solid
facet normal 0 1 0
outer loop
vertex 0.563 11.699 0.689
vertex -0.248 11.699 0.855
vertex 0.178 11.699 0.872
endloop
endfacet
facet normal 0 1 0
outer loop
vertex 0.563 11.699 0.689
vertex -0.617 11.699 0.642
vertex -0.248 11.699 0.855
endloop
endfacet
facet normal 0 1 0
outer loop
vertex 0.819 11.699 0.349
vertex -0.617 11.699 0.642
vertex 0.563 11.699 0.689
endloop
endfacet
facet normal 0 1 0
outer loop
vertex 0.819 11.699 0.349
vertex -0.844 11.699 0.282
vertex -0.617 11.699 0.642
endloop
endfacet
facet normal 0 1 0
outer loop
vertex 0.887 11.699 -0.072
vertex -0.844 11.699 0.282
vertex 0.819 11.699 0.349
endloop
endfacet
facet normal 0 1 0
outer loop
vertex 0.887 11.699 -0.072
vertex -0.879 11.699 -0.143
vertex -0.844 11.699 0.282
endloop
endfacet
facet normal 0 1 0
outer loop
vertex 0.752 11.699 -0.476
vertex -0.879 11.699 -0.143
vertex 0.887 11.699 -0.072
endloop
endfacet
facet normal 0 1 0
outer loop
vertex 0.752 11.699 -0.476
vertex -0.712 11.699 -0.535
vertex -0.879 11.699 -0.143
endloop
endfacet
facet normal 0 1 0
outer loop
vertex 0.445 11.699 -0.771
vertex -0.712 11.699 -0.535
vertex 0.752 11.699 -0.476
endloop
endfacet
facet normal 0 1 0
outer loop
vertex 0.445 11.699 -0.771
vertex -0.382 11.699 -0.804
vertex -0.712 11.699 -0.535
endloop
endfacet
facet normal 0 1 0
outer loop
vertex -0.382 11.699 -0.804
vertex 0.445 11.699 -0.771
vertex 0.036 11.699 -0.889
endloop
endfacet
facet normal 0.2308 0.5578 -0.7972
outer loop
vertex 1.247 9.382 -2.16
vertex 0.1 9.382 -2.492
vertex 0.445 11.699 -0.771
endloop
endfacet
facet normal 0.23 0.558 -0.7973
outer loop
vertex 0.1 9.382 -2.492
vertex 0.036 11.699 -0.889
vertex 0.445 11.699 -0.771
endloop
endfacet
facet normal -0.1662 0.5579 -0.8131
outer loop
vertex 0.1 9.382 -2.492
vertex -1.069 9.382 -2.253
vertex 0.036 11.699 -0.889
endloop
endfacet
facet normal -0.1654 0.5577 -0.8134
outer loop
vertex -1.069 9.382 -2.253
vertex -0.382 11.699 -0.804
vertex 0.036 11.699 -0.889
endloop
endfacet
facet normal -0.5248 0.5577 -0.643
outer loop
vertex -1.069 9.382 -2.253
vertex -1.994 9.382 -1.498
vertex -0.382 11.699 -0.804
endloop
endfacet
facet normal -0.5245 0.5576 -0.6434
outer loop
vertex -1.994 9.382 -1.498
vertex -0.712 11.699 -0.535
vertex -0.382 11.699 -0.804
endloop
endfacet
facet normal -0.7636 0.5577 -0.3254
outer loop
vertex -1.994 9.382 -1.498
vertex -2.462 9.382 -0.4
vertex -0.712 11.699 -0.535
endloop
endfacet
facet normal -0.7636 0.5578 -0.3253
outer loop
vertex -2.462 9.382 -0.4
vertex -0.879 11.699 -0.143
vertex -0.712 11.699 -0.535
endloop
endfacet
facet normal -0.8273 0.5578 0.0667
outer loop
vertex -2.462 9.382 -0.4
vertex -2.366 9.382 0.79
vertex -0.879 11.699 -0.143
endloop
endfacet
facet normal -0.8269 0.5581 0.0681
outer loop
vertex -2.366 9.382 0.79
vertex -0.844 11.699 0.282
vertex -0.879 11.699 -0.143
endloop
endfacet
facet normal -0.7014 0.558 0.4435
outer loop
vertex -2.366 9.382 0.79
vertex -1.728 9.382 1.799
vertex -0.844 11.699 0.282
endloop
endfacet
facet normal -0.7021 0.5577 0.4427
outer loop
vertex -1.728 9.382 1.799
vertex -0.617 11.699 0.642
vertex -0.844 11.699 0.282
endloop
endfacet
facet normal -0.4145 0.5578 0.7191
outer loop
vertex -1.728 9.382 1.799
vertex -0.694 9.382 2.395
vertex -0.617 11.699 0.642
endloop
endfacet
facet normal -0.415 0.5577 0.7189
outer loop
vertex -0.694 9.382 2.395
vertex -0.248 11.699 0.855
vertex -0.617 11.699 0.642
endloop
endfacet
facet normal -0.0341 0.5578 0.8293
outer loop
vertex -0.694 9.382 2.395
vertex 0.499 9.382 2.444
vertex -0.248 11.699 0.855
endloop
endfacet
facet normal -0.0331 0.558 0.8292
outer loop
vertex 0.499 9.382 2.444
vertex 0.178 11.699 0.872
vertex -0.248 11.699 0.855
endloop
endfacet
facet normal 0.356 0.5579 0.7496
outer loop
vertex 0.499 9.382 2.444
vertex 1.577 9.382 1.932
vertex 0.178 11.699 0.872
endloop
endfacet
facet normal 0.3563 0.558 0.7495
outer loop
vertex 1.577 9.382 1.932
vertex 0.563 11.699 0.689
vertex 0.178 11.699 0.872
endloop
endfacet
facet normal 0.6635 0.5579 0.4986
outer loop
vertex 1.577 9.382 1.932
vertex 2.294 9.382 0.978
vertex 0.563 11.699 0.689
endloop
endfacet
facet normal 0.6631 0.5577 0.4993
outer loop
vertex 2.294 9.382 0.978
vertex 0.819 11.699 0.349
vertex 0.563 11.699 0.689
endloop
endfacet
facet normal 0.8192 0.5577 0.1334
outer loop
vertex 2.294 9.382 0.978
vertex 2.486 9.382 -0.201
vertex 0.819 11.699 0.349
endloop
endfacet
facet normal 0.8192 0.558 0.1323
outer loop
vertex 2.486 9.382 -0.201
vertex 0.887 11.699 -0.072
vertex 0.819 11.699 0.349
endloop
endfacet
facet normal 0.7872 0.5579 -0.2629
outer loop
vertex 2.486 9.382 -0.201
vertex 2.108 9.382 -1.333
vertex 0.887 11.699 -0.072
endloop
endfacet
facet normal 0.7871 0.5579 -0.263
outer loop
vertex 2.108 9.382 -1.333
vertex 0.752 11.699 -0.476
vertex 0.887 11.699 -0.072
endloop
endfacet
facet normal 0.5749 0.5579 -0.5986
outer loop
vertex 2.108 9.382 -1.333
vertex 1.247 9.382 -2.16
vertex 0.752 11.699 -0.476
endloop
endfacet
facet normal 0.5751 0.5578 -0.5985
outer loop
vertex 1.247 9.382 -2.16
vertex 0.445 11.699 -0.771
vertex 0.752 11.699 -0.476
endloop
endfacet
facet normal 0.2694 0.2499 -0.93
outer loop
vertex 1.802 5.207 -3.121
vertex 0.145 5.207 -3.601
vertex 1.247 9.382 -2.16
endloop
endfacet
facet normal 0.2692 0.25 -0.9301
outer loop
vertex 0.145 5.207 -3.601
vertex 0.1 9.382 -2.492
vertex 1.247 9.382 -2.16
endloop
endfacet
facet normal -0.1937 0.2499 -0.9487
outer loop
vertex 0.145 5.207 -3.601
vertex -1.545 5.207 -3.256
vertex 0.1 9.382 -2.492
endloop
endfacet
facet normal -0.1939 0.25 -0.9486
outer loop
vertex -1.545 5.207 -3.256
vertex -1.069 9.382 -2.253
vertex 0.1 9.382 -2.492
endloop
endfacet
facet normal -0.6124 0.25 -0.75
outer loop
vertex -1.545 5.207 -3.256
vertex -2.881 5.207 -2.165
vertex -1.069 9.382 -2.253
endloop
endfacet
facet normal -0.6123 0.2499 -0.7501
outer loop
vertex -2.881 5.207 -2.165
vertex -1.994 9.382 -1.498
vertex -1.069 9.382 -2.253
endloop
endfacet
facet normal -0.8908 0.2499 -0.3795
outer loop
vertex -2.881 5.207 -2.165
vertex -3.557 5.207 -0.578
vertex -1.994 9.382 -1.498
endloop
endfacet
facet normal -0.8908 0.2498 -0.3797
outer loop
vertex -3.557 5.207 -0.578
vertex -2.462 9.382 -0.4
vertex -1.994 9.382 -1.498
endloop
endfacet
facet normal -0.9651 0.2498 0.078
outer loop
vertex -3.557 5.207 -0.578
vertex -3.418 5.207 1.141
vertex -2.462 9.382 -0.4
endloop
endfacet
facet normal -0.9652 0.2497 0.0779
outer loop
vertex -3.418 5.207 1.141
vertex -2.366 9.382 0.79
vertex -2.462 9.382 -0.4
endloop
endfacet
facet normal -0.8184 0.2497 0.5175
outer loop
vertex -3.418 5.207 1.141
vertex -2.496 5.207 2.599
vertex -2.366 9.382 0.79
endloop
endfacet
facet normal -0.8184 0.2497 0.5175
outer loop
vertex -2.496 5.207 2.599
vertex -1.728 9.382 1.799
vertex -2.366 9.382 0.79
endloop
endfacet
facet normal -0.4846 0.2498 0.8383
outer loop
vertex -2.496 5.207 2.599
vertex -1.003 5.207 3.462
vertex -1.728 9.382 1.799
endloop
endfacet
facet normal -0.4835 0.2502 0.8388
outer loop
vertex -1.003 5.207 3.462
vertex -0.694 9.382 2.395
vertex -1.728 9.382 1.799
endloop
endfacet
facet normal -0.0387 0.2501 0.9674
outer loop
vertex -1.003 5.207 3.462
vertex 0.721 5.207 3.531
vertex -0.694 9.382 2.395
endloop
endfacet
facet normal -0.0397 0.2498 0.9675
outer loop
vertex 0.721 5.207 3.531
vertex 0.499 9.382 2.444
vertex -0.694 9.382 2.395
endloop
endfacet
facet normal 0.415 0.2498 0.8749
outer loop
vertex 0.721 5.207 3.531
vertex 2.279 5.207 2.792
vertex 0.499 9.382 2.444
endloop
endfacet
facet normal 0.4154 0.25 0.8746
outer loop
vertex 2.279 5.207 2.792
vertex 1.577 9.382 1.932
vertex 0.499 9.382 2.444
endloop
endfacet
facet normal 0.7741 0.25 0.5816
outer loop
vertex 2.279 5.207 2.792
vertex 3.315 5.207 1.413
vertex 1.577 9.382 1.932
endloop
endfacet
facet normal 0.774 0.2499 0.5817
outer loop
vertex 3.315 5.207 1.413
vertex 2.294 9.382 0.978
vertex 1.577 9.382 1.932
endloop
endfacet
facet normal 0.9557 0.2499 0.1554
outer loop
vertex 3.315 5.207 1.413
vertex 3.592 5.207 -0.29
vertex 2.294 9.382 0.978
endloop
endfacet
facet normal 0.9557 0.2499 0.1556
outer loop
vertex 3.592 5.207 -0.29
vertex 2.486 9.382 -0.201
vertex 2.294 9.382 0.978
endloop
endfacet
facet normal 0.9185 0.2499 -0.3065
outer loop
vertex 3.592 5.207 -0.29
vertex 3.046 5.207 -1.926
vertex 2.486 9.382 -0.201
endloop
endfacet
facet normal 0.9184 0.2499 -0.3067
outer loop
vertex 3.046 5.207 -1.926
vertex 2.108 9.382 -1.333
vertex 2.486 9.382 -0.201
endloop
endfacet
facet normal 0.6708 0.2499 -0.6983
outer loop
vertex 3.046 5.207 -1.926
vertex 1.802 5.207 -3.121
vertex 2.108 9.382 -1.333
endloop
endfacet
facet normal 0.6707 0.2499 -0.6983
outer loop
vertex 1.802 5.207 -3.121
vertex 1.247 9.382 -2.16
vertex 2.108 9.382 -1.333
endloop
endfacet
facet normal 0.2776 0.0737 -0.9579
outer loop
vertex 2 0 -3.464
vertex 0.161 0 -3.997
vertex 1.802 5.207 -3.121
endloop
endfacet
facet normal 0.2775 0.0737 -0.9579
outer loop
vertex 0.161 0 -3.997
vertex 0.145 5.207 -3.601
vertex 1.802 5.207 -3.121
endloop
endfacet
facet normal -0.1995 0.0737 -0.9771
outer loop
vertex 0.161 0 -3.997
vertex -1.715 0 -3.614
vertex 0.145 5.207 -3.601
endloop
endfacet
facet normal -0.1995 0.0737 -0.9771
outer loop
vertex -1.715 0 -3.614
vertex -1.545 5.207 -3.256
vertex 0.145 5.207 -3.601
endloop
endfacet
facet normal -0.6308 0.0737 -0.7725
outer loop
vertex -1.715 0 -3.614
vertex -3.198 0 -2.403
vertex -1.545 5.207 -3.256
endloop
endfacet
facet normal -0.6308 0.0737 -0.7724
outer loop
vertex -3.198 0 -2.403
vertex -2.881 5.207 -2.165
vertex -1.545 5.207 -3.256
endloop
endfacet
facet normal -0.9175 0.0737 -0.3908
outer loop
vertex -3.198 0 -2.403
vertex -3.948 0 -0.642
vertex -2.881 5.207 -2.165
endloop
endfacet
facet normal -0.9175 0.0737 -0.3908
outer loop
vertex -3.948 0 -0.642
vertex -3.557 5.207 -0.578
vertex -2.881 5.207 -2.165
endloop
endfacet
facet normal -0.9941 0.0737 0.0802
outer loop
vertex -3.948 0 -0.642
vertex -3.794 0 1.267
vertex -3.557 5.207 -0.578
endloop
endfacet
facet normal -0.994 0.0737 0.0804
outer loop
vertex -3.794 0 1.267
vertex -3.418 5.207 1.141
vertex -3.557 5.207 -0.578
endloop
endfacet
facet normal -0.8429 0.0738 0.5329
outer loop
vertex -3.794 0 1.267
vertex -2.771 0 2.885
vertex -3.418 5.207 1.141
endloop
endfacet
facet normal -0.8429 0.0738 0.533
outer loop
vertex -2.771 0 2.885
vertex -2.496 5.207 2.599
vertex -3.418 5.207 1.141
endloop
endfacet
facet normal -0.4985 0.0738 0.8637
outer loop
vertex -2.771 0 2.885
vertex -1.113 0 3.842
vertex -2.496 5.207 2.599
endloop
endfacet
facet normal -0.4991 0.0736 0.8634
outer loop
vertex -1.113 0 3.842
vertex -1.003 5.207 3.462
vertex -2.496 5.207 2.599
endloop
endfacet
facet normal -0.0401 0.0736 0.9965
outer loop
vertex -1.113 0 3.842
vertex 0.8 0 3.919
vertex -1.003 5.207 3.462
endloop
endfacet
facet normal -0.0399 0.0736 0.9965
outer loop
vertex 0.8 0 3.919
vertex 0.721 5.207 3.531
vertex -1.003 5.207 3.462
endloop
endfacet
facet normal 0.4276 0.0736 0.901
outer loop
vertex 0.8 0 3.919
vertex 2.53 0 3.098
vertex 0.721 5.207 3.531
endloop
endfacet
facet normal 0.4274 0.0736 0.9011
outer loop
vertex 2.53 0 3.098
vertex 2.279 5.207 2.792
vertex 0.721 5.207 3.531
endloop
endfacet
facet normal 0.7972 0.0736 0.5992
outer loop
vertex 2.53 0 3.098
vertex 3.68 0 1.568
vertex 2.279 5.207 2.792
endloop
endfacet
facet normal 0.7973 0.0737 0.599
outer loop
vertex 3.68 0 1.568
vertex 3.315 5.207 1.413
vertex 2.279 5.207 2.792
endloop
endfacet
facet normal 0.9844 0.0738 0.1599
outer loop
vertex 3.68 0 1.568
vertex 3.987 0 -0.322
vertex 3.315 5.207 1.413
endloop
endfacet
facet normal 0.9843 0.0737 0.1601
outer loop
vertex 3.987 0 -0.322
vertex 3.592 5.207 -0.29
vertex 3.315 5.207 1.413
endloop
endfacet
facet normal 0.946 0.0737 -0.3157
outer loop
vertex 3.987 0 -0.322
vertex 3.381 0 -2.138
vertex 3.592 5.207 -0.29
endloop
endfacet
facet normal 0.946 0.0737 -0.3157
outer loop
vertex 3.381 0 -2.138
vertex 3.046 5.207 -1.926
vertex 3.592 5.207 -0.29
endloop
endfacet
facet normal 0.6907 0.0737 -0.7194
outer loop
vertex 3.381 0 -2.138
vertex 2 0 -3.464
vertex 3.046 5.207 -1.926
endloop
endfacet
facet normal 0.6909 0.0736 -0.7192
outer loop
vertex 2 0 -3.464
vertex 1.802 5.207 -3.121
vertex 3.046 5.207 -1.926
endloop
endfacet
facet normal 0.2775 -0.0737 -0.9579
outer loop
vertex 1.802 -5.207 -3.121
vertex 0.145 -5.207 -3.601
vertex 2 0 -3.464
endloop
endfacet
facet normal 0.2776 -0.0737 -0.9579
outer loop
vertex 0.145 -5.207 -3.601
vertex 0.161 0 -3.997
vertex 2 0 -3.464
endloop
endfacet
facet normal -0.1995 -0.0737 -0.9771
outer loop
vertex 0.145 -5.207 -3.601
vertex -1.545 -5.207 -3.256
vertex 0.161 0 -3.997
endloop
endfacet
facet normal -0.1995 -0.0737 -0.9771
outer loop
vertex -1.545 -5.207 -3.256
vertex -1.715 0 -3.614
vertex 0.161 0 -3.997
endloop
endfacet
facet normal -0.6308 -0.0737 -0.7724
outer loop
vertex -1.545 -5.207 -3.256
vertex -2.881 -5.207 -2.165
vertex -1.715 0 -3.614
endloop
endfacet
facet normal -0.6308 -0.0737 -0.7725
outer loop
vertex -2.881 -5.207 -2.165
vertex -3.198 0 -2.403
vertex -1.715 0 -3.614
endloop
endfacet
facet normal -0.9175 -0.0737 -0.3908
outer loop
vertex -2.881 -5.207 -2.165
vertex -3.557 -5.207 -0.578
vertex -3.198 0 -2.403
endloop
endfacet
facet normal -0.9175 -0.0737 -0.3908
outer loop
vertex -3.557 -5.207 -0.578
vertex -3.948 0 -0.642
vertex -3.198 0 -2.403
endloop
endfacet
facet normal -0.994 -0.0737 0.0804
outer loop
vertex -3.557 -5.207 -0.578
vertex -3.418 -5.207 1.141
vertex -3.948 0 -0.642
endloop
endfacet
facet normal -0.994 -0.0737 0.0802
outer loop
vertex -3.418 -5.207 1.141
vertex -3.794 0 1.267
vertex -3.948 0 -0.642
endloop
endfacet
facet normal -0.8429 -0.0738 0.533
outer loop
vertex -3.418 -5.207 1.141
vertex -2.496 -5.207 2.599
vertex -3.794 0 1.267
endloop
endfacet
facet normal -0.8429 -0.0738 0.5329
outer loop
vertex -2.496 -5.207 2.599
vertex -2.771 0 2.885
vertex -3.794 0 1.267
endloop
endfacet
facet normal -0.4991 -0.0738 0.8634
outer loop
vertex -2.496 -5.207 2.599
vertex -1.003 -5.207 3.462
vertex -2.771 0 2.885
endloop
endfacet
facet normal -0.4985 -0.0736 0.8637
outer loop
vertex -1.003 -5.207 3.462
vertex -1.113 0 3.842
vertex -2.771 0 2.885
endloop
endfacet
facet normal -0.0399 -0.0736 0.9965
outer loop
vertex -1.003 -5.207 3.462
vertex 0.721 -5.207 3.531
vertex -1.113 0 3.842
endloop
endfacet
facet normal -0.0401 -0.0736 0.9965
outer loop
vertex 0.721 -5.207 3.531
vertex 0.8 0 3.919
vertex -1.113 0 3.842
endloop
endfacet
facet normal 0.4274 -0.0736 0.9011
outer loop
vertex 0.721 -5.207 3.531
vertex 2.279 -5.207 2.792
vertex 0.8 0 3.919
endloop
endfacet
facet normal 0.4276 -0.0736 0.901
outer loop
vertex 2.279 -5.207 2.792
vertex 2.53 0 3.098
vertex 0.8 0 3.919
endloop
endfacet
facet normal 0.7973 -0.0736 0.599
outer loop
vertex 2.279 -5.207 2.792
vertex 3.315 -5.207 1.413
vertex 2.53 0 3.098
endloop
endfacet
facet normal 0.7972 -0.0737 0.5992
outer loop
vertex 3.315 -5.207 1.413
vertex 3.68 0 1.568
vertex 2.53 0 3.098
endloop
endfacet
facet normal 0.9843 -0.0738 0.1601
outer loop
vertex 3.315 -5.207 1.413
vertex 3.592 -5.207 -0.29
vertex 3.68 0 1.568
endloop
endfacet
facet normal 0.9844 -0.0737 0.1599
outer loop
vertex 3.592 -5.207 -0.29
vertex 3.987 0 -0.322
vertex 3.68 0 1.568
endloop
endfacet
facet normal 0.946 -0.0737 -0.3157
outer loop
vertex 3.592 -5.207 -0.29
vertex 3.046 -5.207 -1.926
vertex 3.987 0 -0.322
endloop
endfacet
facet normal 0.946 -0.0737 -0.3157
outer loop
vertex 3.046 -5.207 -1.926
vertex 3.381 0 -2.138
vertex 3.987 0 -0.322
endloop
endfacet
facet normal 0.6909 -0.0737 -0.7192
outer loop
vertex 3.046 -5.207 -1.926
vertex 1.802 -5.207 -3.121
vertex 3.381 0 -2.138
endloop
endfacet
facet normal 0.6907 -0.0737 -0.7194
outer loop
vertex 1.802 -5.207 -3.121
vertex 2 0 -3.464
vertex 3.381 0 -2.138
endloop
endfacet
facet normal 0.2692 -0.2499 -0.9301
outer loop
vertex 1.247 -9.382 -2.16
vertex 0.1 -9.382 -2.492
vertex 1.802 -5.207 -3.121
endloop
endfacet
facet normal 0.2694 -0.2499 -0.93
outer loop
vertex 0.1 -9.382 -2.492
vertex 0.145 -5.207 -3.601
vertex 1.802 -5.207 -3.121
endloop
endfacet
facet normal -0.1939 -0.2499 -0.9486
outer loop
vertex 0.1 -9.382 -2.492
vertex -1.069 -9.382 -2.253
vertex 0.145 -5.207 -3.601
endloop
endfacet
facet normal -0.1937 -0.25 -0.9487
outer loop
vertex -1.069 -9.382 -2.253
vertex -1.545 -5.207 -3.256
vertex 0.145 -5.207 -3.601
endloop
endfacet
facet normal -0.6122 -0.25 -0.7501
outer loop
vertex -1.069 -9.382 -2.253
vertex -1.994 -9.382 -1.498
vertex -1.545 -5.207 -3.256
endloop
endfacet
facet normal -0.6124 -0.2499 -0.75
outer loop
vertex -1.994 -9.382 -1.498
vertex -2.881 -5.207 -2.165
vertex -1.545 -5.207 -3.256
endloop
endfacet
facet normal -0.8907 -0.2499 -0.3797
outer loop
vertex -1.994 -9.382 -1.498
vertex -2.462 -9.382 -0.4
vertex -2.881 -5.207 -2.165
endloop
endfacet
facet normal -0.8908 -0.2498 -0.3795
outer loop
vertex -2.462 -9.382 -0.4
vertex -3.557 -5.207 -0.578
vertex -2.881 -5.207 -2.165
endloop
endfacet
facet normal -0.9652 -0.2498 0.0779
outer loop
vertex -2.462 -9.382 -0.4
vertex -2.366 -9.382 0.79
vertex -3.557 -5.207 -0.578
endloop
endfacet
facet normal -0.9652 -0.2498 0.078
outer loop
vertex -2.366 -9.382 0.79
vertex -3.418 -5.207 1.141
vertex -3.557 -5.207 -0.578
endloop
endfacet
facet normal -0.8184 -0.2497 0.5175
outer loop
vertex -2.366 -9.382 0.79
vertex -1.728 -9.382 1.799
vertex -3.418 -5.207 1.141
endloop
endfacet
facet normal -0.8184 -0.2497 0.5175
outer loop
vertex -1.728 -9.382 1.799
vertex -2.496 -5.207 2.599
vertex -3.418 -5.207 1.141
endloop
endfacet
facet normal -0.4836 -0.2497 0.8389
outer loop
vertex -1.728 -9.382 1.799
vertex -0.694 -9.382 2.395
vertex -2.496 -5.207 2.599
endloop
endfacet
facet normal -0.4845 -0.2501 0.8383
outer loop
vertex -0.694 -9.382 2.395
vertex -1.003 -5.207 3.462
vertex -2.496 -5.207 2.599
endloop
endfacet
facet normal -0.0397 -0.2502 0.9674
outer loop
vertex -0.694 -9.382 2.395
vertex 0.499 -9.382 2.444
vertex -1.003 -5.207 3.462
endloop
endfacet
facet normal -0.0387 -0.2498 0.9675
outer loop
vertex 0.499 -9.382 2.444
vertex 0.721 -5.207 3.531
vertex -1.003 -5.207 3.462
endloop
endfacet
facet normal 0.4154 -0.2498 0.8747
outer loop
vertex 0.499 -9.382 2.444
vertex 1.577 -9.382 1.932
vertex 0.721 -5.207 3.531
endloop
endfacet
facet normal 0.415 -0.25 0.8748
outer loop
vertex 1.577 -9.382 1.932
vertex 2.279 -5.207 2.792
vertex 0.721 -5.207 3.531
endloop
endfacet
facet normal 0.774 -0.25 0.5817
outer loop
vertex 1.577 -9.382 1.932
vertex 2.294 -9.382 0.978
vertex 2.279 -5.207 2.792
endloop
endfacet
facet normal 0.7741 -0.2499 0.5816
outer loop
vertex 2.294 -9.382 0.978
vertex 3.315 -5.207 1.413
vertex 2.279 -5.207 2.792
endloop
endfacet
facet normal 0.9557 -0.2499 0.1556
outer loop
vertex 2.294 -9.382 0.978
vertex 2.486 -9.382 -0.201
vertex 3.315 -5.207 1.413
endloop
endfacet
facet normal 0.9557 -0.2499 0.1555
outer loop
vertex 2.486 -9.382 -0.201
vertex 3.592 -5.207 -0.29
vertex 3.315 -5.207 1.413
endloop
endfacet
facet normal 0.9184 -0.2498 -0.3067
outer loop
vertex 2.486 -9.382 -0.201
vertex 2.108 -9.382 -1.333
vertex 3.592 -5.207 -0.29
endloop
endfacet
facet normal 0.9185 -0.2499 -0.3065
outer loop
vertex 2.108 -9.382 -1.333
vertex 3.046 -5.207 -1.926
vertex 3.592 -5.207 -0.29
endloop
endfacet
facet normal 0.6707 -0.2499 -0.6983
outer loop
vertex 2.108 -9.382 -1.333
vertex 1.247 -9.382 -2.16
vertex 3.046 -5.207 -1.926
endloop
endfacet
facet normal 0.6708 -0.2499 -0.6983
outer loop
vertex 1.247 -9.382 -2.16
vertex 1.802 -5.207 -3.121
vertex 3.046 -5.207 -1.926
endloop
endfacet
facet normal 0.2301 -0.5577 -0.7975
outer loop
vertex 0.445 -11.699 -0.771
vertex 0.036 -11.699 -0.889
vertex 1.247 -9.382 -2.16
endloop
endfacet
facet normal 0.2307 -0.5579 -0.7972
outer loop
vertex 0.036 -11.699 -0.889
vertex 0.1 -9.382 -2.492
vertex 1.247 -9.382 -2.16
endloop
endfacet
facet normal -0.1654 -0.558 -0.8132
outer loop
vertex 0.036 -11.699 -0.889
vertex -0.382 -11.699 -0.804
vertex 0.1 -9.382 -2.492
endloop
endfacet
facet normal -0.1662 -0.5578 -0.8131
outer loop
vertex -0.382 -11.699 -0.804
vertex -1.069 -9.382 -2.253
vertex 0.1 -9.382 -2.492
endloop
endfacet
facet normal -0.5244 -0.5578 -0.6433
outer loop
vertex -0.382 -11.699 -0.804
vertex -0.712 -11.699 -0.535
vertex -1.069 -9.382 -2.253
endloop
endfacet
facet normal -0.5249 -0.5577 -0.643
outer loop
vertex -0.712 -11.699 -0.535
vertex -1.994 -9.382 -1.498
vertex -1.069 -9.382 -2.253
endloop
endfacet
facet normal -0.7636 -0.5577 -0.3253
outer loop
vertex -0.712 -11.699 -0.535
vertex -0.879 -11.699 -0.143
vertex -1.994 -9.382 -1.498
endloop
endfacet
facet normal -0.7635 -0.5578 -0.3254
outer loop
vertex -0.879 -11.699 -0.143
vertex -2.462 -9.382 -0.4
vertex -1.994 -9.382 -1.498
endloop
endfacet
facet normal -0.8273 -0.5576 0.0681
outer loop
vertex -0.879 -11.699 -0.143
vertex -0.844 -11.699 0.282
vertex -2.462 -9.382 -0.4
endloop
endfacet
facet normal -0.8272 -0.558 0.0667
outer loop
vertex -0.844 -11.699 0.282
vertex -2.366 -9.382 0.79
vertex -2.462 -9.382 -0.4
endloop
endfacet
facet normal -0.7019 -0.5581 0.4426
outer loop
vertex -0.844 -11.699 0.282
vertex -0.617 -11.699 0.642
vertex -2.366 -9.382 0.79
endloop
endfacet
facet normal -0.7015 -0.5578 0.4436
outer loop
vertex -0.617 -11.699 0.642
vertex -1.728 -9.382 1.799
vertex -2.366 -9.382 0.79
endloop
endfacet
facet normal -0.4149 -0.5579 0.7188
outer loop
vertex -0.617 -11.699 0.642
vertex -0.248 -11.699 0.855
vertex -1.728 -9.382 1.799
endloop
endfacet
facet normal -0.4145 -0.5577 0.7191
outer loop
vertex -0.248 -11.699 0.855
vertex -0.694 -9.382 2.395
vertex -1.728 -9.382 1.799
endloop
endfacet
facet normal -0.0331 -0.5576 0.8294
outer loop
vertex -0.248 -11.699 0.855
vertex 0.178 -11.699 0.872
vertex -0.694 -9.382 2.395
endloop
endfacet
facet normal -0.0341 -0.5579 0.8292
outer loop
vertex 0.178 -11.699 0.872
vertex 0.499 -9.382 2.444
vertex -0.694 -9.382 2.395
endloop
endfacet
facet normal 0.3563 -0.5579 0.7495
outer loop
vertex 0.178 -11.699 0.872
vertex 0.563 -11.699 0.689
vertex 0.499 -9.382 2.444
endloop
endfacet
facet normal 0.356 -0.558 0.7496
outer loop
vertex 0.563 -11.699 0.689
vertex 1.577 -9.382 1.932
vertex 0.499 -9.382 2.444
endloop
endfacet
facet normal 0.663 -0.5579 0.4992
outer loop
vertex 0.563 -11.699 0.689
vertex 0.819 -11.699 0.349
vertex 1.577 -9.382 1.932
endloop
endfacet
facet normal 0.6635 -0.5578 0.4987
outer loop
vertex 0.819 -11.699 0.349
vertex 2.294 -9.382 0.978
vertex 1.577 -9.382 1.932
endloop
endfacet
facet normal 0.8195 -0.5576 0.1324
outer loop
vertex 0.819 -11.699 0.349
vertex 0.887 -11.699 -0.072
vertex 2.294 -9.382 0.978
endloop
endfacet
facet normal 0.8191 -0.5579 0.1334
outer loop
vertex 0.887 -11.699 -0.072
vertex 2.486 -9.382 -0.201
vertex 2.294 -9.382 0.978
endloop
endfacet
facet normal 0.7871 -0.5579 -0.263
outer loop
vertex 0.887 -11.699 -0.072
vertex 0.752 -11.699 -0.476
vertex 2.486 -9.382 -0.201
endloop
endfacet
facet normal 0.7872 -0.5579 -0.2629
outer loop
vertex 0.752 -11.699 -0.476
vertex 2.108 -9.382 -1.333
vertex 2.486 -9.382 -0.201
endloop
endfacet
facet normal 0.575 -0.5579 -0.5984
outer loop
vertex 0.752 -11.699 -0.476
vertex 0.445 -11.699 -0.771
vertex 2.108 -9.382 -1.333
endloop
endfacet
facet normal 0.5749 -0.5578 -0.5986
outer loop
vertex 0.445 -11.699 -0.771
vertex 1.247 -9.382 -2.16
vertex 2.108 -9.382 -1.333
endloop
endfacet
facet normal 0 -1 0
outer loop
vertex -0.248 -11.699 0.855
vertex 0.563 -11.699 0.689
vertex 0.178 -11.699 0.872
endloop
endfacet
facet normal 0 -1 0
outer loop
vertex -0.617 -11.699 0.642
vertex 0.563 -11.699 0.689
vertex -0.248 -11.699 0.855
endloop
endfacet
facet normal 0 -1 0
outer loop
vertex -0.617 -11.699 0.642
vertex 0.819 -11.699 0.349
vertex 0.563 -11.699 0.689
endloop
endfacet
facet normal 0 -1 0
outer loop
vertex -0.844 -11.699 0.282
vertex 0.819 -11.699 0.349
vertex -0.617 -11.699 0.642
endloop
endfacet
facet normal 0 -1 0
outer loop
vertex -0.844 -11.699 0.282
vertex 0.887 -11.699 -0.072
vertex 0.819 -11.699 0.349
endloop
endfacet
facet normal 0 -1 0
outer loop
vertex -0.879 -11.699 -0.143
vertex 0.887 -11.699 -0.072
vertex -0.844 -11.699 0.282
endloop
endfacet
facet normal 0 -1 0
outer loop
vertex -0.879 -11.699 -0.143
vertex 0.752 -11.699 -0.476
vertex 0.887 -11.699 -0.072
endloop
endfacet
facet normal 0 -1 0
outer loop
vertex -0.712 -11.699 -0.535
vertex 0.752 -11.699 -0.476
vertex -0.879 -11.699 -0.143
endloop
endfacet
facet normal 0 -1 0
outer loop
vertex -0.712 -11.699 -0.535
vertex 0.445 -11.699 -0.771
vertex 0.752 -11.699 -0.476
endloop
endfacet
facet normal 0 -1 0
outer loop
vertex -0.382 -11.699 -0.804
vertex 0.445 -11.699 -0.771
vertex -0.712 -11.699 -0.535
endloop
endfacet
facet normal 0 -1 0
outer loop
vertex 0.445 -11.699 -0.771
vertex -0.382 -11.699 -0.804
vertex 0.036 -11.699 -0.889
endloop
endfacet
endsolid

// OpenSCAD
// Generated by generate_scads.py
scale([2.0,1.5,2.0]) {
  scale([0.5,2.0,0.5]) {
    rotate([90,120,180]) {
      sphere(r=4);
    }
  }
}
